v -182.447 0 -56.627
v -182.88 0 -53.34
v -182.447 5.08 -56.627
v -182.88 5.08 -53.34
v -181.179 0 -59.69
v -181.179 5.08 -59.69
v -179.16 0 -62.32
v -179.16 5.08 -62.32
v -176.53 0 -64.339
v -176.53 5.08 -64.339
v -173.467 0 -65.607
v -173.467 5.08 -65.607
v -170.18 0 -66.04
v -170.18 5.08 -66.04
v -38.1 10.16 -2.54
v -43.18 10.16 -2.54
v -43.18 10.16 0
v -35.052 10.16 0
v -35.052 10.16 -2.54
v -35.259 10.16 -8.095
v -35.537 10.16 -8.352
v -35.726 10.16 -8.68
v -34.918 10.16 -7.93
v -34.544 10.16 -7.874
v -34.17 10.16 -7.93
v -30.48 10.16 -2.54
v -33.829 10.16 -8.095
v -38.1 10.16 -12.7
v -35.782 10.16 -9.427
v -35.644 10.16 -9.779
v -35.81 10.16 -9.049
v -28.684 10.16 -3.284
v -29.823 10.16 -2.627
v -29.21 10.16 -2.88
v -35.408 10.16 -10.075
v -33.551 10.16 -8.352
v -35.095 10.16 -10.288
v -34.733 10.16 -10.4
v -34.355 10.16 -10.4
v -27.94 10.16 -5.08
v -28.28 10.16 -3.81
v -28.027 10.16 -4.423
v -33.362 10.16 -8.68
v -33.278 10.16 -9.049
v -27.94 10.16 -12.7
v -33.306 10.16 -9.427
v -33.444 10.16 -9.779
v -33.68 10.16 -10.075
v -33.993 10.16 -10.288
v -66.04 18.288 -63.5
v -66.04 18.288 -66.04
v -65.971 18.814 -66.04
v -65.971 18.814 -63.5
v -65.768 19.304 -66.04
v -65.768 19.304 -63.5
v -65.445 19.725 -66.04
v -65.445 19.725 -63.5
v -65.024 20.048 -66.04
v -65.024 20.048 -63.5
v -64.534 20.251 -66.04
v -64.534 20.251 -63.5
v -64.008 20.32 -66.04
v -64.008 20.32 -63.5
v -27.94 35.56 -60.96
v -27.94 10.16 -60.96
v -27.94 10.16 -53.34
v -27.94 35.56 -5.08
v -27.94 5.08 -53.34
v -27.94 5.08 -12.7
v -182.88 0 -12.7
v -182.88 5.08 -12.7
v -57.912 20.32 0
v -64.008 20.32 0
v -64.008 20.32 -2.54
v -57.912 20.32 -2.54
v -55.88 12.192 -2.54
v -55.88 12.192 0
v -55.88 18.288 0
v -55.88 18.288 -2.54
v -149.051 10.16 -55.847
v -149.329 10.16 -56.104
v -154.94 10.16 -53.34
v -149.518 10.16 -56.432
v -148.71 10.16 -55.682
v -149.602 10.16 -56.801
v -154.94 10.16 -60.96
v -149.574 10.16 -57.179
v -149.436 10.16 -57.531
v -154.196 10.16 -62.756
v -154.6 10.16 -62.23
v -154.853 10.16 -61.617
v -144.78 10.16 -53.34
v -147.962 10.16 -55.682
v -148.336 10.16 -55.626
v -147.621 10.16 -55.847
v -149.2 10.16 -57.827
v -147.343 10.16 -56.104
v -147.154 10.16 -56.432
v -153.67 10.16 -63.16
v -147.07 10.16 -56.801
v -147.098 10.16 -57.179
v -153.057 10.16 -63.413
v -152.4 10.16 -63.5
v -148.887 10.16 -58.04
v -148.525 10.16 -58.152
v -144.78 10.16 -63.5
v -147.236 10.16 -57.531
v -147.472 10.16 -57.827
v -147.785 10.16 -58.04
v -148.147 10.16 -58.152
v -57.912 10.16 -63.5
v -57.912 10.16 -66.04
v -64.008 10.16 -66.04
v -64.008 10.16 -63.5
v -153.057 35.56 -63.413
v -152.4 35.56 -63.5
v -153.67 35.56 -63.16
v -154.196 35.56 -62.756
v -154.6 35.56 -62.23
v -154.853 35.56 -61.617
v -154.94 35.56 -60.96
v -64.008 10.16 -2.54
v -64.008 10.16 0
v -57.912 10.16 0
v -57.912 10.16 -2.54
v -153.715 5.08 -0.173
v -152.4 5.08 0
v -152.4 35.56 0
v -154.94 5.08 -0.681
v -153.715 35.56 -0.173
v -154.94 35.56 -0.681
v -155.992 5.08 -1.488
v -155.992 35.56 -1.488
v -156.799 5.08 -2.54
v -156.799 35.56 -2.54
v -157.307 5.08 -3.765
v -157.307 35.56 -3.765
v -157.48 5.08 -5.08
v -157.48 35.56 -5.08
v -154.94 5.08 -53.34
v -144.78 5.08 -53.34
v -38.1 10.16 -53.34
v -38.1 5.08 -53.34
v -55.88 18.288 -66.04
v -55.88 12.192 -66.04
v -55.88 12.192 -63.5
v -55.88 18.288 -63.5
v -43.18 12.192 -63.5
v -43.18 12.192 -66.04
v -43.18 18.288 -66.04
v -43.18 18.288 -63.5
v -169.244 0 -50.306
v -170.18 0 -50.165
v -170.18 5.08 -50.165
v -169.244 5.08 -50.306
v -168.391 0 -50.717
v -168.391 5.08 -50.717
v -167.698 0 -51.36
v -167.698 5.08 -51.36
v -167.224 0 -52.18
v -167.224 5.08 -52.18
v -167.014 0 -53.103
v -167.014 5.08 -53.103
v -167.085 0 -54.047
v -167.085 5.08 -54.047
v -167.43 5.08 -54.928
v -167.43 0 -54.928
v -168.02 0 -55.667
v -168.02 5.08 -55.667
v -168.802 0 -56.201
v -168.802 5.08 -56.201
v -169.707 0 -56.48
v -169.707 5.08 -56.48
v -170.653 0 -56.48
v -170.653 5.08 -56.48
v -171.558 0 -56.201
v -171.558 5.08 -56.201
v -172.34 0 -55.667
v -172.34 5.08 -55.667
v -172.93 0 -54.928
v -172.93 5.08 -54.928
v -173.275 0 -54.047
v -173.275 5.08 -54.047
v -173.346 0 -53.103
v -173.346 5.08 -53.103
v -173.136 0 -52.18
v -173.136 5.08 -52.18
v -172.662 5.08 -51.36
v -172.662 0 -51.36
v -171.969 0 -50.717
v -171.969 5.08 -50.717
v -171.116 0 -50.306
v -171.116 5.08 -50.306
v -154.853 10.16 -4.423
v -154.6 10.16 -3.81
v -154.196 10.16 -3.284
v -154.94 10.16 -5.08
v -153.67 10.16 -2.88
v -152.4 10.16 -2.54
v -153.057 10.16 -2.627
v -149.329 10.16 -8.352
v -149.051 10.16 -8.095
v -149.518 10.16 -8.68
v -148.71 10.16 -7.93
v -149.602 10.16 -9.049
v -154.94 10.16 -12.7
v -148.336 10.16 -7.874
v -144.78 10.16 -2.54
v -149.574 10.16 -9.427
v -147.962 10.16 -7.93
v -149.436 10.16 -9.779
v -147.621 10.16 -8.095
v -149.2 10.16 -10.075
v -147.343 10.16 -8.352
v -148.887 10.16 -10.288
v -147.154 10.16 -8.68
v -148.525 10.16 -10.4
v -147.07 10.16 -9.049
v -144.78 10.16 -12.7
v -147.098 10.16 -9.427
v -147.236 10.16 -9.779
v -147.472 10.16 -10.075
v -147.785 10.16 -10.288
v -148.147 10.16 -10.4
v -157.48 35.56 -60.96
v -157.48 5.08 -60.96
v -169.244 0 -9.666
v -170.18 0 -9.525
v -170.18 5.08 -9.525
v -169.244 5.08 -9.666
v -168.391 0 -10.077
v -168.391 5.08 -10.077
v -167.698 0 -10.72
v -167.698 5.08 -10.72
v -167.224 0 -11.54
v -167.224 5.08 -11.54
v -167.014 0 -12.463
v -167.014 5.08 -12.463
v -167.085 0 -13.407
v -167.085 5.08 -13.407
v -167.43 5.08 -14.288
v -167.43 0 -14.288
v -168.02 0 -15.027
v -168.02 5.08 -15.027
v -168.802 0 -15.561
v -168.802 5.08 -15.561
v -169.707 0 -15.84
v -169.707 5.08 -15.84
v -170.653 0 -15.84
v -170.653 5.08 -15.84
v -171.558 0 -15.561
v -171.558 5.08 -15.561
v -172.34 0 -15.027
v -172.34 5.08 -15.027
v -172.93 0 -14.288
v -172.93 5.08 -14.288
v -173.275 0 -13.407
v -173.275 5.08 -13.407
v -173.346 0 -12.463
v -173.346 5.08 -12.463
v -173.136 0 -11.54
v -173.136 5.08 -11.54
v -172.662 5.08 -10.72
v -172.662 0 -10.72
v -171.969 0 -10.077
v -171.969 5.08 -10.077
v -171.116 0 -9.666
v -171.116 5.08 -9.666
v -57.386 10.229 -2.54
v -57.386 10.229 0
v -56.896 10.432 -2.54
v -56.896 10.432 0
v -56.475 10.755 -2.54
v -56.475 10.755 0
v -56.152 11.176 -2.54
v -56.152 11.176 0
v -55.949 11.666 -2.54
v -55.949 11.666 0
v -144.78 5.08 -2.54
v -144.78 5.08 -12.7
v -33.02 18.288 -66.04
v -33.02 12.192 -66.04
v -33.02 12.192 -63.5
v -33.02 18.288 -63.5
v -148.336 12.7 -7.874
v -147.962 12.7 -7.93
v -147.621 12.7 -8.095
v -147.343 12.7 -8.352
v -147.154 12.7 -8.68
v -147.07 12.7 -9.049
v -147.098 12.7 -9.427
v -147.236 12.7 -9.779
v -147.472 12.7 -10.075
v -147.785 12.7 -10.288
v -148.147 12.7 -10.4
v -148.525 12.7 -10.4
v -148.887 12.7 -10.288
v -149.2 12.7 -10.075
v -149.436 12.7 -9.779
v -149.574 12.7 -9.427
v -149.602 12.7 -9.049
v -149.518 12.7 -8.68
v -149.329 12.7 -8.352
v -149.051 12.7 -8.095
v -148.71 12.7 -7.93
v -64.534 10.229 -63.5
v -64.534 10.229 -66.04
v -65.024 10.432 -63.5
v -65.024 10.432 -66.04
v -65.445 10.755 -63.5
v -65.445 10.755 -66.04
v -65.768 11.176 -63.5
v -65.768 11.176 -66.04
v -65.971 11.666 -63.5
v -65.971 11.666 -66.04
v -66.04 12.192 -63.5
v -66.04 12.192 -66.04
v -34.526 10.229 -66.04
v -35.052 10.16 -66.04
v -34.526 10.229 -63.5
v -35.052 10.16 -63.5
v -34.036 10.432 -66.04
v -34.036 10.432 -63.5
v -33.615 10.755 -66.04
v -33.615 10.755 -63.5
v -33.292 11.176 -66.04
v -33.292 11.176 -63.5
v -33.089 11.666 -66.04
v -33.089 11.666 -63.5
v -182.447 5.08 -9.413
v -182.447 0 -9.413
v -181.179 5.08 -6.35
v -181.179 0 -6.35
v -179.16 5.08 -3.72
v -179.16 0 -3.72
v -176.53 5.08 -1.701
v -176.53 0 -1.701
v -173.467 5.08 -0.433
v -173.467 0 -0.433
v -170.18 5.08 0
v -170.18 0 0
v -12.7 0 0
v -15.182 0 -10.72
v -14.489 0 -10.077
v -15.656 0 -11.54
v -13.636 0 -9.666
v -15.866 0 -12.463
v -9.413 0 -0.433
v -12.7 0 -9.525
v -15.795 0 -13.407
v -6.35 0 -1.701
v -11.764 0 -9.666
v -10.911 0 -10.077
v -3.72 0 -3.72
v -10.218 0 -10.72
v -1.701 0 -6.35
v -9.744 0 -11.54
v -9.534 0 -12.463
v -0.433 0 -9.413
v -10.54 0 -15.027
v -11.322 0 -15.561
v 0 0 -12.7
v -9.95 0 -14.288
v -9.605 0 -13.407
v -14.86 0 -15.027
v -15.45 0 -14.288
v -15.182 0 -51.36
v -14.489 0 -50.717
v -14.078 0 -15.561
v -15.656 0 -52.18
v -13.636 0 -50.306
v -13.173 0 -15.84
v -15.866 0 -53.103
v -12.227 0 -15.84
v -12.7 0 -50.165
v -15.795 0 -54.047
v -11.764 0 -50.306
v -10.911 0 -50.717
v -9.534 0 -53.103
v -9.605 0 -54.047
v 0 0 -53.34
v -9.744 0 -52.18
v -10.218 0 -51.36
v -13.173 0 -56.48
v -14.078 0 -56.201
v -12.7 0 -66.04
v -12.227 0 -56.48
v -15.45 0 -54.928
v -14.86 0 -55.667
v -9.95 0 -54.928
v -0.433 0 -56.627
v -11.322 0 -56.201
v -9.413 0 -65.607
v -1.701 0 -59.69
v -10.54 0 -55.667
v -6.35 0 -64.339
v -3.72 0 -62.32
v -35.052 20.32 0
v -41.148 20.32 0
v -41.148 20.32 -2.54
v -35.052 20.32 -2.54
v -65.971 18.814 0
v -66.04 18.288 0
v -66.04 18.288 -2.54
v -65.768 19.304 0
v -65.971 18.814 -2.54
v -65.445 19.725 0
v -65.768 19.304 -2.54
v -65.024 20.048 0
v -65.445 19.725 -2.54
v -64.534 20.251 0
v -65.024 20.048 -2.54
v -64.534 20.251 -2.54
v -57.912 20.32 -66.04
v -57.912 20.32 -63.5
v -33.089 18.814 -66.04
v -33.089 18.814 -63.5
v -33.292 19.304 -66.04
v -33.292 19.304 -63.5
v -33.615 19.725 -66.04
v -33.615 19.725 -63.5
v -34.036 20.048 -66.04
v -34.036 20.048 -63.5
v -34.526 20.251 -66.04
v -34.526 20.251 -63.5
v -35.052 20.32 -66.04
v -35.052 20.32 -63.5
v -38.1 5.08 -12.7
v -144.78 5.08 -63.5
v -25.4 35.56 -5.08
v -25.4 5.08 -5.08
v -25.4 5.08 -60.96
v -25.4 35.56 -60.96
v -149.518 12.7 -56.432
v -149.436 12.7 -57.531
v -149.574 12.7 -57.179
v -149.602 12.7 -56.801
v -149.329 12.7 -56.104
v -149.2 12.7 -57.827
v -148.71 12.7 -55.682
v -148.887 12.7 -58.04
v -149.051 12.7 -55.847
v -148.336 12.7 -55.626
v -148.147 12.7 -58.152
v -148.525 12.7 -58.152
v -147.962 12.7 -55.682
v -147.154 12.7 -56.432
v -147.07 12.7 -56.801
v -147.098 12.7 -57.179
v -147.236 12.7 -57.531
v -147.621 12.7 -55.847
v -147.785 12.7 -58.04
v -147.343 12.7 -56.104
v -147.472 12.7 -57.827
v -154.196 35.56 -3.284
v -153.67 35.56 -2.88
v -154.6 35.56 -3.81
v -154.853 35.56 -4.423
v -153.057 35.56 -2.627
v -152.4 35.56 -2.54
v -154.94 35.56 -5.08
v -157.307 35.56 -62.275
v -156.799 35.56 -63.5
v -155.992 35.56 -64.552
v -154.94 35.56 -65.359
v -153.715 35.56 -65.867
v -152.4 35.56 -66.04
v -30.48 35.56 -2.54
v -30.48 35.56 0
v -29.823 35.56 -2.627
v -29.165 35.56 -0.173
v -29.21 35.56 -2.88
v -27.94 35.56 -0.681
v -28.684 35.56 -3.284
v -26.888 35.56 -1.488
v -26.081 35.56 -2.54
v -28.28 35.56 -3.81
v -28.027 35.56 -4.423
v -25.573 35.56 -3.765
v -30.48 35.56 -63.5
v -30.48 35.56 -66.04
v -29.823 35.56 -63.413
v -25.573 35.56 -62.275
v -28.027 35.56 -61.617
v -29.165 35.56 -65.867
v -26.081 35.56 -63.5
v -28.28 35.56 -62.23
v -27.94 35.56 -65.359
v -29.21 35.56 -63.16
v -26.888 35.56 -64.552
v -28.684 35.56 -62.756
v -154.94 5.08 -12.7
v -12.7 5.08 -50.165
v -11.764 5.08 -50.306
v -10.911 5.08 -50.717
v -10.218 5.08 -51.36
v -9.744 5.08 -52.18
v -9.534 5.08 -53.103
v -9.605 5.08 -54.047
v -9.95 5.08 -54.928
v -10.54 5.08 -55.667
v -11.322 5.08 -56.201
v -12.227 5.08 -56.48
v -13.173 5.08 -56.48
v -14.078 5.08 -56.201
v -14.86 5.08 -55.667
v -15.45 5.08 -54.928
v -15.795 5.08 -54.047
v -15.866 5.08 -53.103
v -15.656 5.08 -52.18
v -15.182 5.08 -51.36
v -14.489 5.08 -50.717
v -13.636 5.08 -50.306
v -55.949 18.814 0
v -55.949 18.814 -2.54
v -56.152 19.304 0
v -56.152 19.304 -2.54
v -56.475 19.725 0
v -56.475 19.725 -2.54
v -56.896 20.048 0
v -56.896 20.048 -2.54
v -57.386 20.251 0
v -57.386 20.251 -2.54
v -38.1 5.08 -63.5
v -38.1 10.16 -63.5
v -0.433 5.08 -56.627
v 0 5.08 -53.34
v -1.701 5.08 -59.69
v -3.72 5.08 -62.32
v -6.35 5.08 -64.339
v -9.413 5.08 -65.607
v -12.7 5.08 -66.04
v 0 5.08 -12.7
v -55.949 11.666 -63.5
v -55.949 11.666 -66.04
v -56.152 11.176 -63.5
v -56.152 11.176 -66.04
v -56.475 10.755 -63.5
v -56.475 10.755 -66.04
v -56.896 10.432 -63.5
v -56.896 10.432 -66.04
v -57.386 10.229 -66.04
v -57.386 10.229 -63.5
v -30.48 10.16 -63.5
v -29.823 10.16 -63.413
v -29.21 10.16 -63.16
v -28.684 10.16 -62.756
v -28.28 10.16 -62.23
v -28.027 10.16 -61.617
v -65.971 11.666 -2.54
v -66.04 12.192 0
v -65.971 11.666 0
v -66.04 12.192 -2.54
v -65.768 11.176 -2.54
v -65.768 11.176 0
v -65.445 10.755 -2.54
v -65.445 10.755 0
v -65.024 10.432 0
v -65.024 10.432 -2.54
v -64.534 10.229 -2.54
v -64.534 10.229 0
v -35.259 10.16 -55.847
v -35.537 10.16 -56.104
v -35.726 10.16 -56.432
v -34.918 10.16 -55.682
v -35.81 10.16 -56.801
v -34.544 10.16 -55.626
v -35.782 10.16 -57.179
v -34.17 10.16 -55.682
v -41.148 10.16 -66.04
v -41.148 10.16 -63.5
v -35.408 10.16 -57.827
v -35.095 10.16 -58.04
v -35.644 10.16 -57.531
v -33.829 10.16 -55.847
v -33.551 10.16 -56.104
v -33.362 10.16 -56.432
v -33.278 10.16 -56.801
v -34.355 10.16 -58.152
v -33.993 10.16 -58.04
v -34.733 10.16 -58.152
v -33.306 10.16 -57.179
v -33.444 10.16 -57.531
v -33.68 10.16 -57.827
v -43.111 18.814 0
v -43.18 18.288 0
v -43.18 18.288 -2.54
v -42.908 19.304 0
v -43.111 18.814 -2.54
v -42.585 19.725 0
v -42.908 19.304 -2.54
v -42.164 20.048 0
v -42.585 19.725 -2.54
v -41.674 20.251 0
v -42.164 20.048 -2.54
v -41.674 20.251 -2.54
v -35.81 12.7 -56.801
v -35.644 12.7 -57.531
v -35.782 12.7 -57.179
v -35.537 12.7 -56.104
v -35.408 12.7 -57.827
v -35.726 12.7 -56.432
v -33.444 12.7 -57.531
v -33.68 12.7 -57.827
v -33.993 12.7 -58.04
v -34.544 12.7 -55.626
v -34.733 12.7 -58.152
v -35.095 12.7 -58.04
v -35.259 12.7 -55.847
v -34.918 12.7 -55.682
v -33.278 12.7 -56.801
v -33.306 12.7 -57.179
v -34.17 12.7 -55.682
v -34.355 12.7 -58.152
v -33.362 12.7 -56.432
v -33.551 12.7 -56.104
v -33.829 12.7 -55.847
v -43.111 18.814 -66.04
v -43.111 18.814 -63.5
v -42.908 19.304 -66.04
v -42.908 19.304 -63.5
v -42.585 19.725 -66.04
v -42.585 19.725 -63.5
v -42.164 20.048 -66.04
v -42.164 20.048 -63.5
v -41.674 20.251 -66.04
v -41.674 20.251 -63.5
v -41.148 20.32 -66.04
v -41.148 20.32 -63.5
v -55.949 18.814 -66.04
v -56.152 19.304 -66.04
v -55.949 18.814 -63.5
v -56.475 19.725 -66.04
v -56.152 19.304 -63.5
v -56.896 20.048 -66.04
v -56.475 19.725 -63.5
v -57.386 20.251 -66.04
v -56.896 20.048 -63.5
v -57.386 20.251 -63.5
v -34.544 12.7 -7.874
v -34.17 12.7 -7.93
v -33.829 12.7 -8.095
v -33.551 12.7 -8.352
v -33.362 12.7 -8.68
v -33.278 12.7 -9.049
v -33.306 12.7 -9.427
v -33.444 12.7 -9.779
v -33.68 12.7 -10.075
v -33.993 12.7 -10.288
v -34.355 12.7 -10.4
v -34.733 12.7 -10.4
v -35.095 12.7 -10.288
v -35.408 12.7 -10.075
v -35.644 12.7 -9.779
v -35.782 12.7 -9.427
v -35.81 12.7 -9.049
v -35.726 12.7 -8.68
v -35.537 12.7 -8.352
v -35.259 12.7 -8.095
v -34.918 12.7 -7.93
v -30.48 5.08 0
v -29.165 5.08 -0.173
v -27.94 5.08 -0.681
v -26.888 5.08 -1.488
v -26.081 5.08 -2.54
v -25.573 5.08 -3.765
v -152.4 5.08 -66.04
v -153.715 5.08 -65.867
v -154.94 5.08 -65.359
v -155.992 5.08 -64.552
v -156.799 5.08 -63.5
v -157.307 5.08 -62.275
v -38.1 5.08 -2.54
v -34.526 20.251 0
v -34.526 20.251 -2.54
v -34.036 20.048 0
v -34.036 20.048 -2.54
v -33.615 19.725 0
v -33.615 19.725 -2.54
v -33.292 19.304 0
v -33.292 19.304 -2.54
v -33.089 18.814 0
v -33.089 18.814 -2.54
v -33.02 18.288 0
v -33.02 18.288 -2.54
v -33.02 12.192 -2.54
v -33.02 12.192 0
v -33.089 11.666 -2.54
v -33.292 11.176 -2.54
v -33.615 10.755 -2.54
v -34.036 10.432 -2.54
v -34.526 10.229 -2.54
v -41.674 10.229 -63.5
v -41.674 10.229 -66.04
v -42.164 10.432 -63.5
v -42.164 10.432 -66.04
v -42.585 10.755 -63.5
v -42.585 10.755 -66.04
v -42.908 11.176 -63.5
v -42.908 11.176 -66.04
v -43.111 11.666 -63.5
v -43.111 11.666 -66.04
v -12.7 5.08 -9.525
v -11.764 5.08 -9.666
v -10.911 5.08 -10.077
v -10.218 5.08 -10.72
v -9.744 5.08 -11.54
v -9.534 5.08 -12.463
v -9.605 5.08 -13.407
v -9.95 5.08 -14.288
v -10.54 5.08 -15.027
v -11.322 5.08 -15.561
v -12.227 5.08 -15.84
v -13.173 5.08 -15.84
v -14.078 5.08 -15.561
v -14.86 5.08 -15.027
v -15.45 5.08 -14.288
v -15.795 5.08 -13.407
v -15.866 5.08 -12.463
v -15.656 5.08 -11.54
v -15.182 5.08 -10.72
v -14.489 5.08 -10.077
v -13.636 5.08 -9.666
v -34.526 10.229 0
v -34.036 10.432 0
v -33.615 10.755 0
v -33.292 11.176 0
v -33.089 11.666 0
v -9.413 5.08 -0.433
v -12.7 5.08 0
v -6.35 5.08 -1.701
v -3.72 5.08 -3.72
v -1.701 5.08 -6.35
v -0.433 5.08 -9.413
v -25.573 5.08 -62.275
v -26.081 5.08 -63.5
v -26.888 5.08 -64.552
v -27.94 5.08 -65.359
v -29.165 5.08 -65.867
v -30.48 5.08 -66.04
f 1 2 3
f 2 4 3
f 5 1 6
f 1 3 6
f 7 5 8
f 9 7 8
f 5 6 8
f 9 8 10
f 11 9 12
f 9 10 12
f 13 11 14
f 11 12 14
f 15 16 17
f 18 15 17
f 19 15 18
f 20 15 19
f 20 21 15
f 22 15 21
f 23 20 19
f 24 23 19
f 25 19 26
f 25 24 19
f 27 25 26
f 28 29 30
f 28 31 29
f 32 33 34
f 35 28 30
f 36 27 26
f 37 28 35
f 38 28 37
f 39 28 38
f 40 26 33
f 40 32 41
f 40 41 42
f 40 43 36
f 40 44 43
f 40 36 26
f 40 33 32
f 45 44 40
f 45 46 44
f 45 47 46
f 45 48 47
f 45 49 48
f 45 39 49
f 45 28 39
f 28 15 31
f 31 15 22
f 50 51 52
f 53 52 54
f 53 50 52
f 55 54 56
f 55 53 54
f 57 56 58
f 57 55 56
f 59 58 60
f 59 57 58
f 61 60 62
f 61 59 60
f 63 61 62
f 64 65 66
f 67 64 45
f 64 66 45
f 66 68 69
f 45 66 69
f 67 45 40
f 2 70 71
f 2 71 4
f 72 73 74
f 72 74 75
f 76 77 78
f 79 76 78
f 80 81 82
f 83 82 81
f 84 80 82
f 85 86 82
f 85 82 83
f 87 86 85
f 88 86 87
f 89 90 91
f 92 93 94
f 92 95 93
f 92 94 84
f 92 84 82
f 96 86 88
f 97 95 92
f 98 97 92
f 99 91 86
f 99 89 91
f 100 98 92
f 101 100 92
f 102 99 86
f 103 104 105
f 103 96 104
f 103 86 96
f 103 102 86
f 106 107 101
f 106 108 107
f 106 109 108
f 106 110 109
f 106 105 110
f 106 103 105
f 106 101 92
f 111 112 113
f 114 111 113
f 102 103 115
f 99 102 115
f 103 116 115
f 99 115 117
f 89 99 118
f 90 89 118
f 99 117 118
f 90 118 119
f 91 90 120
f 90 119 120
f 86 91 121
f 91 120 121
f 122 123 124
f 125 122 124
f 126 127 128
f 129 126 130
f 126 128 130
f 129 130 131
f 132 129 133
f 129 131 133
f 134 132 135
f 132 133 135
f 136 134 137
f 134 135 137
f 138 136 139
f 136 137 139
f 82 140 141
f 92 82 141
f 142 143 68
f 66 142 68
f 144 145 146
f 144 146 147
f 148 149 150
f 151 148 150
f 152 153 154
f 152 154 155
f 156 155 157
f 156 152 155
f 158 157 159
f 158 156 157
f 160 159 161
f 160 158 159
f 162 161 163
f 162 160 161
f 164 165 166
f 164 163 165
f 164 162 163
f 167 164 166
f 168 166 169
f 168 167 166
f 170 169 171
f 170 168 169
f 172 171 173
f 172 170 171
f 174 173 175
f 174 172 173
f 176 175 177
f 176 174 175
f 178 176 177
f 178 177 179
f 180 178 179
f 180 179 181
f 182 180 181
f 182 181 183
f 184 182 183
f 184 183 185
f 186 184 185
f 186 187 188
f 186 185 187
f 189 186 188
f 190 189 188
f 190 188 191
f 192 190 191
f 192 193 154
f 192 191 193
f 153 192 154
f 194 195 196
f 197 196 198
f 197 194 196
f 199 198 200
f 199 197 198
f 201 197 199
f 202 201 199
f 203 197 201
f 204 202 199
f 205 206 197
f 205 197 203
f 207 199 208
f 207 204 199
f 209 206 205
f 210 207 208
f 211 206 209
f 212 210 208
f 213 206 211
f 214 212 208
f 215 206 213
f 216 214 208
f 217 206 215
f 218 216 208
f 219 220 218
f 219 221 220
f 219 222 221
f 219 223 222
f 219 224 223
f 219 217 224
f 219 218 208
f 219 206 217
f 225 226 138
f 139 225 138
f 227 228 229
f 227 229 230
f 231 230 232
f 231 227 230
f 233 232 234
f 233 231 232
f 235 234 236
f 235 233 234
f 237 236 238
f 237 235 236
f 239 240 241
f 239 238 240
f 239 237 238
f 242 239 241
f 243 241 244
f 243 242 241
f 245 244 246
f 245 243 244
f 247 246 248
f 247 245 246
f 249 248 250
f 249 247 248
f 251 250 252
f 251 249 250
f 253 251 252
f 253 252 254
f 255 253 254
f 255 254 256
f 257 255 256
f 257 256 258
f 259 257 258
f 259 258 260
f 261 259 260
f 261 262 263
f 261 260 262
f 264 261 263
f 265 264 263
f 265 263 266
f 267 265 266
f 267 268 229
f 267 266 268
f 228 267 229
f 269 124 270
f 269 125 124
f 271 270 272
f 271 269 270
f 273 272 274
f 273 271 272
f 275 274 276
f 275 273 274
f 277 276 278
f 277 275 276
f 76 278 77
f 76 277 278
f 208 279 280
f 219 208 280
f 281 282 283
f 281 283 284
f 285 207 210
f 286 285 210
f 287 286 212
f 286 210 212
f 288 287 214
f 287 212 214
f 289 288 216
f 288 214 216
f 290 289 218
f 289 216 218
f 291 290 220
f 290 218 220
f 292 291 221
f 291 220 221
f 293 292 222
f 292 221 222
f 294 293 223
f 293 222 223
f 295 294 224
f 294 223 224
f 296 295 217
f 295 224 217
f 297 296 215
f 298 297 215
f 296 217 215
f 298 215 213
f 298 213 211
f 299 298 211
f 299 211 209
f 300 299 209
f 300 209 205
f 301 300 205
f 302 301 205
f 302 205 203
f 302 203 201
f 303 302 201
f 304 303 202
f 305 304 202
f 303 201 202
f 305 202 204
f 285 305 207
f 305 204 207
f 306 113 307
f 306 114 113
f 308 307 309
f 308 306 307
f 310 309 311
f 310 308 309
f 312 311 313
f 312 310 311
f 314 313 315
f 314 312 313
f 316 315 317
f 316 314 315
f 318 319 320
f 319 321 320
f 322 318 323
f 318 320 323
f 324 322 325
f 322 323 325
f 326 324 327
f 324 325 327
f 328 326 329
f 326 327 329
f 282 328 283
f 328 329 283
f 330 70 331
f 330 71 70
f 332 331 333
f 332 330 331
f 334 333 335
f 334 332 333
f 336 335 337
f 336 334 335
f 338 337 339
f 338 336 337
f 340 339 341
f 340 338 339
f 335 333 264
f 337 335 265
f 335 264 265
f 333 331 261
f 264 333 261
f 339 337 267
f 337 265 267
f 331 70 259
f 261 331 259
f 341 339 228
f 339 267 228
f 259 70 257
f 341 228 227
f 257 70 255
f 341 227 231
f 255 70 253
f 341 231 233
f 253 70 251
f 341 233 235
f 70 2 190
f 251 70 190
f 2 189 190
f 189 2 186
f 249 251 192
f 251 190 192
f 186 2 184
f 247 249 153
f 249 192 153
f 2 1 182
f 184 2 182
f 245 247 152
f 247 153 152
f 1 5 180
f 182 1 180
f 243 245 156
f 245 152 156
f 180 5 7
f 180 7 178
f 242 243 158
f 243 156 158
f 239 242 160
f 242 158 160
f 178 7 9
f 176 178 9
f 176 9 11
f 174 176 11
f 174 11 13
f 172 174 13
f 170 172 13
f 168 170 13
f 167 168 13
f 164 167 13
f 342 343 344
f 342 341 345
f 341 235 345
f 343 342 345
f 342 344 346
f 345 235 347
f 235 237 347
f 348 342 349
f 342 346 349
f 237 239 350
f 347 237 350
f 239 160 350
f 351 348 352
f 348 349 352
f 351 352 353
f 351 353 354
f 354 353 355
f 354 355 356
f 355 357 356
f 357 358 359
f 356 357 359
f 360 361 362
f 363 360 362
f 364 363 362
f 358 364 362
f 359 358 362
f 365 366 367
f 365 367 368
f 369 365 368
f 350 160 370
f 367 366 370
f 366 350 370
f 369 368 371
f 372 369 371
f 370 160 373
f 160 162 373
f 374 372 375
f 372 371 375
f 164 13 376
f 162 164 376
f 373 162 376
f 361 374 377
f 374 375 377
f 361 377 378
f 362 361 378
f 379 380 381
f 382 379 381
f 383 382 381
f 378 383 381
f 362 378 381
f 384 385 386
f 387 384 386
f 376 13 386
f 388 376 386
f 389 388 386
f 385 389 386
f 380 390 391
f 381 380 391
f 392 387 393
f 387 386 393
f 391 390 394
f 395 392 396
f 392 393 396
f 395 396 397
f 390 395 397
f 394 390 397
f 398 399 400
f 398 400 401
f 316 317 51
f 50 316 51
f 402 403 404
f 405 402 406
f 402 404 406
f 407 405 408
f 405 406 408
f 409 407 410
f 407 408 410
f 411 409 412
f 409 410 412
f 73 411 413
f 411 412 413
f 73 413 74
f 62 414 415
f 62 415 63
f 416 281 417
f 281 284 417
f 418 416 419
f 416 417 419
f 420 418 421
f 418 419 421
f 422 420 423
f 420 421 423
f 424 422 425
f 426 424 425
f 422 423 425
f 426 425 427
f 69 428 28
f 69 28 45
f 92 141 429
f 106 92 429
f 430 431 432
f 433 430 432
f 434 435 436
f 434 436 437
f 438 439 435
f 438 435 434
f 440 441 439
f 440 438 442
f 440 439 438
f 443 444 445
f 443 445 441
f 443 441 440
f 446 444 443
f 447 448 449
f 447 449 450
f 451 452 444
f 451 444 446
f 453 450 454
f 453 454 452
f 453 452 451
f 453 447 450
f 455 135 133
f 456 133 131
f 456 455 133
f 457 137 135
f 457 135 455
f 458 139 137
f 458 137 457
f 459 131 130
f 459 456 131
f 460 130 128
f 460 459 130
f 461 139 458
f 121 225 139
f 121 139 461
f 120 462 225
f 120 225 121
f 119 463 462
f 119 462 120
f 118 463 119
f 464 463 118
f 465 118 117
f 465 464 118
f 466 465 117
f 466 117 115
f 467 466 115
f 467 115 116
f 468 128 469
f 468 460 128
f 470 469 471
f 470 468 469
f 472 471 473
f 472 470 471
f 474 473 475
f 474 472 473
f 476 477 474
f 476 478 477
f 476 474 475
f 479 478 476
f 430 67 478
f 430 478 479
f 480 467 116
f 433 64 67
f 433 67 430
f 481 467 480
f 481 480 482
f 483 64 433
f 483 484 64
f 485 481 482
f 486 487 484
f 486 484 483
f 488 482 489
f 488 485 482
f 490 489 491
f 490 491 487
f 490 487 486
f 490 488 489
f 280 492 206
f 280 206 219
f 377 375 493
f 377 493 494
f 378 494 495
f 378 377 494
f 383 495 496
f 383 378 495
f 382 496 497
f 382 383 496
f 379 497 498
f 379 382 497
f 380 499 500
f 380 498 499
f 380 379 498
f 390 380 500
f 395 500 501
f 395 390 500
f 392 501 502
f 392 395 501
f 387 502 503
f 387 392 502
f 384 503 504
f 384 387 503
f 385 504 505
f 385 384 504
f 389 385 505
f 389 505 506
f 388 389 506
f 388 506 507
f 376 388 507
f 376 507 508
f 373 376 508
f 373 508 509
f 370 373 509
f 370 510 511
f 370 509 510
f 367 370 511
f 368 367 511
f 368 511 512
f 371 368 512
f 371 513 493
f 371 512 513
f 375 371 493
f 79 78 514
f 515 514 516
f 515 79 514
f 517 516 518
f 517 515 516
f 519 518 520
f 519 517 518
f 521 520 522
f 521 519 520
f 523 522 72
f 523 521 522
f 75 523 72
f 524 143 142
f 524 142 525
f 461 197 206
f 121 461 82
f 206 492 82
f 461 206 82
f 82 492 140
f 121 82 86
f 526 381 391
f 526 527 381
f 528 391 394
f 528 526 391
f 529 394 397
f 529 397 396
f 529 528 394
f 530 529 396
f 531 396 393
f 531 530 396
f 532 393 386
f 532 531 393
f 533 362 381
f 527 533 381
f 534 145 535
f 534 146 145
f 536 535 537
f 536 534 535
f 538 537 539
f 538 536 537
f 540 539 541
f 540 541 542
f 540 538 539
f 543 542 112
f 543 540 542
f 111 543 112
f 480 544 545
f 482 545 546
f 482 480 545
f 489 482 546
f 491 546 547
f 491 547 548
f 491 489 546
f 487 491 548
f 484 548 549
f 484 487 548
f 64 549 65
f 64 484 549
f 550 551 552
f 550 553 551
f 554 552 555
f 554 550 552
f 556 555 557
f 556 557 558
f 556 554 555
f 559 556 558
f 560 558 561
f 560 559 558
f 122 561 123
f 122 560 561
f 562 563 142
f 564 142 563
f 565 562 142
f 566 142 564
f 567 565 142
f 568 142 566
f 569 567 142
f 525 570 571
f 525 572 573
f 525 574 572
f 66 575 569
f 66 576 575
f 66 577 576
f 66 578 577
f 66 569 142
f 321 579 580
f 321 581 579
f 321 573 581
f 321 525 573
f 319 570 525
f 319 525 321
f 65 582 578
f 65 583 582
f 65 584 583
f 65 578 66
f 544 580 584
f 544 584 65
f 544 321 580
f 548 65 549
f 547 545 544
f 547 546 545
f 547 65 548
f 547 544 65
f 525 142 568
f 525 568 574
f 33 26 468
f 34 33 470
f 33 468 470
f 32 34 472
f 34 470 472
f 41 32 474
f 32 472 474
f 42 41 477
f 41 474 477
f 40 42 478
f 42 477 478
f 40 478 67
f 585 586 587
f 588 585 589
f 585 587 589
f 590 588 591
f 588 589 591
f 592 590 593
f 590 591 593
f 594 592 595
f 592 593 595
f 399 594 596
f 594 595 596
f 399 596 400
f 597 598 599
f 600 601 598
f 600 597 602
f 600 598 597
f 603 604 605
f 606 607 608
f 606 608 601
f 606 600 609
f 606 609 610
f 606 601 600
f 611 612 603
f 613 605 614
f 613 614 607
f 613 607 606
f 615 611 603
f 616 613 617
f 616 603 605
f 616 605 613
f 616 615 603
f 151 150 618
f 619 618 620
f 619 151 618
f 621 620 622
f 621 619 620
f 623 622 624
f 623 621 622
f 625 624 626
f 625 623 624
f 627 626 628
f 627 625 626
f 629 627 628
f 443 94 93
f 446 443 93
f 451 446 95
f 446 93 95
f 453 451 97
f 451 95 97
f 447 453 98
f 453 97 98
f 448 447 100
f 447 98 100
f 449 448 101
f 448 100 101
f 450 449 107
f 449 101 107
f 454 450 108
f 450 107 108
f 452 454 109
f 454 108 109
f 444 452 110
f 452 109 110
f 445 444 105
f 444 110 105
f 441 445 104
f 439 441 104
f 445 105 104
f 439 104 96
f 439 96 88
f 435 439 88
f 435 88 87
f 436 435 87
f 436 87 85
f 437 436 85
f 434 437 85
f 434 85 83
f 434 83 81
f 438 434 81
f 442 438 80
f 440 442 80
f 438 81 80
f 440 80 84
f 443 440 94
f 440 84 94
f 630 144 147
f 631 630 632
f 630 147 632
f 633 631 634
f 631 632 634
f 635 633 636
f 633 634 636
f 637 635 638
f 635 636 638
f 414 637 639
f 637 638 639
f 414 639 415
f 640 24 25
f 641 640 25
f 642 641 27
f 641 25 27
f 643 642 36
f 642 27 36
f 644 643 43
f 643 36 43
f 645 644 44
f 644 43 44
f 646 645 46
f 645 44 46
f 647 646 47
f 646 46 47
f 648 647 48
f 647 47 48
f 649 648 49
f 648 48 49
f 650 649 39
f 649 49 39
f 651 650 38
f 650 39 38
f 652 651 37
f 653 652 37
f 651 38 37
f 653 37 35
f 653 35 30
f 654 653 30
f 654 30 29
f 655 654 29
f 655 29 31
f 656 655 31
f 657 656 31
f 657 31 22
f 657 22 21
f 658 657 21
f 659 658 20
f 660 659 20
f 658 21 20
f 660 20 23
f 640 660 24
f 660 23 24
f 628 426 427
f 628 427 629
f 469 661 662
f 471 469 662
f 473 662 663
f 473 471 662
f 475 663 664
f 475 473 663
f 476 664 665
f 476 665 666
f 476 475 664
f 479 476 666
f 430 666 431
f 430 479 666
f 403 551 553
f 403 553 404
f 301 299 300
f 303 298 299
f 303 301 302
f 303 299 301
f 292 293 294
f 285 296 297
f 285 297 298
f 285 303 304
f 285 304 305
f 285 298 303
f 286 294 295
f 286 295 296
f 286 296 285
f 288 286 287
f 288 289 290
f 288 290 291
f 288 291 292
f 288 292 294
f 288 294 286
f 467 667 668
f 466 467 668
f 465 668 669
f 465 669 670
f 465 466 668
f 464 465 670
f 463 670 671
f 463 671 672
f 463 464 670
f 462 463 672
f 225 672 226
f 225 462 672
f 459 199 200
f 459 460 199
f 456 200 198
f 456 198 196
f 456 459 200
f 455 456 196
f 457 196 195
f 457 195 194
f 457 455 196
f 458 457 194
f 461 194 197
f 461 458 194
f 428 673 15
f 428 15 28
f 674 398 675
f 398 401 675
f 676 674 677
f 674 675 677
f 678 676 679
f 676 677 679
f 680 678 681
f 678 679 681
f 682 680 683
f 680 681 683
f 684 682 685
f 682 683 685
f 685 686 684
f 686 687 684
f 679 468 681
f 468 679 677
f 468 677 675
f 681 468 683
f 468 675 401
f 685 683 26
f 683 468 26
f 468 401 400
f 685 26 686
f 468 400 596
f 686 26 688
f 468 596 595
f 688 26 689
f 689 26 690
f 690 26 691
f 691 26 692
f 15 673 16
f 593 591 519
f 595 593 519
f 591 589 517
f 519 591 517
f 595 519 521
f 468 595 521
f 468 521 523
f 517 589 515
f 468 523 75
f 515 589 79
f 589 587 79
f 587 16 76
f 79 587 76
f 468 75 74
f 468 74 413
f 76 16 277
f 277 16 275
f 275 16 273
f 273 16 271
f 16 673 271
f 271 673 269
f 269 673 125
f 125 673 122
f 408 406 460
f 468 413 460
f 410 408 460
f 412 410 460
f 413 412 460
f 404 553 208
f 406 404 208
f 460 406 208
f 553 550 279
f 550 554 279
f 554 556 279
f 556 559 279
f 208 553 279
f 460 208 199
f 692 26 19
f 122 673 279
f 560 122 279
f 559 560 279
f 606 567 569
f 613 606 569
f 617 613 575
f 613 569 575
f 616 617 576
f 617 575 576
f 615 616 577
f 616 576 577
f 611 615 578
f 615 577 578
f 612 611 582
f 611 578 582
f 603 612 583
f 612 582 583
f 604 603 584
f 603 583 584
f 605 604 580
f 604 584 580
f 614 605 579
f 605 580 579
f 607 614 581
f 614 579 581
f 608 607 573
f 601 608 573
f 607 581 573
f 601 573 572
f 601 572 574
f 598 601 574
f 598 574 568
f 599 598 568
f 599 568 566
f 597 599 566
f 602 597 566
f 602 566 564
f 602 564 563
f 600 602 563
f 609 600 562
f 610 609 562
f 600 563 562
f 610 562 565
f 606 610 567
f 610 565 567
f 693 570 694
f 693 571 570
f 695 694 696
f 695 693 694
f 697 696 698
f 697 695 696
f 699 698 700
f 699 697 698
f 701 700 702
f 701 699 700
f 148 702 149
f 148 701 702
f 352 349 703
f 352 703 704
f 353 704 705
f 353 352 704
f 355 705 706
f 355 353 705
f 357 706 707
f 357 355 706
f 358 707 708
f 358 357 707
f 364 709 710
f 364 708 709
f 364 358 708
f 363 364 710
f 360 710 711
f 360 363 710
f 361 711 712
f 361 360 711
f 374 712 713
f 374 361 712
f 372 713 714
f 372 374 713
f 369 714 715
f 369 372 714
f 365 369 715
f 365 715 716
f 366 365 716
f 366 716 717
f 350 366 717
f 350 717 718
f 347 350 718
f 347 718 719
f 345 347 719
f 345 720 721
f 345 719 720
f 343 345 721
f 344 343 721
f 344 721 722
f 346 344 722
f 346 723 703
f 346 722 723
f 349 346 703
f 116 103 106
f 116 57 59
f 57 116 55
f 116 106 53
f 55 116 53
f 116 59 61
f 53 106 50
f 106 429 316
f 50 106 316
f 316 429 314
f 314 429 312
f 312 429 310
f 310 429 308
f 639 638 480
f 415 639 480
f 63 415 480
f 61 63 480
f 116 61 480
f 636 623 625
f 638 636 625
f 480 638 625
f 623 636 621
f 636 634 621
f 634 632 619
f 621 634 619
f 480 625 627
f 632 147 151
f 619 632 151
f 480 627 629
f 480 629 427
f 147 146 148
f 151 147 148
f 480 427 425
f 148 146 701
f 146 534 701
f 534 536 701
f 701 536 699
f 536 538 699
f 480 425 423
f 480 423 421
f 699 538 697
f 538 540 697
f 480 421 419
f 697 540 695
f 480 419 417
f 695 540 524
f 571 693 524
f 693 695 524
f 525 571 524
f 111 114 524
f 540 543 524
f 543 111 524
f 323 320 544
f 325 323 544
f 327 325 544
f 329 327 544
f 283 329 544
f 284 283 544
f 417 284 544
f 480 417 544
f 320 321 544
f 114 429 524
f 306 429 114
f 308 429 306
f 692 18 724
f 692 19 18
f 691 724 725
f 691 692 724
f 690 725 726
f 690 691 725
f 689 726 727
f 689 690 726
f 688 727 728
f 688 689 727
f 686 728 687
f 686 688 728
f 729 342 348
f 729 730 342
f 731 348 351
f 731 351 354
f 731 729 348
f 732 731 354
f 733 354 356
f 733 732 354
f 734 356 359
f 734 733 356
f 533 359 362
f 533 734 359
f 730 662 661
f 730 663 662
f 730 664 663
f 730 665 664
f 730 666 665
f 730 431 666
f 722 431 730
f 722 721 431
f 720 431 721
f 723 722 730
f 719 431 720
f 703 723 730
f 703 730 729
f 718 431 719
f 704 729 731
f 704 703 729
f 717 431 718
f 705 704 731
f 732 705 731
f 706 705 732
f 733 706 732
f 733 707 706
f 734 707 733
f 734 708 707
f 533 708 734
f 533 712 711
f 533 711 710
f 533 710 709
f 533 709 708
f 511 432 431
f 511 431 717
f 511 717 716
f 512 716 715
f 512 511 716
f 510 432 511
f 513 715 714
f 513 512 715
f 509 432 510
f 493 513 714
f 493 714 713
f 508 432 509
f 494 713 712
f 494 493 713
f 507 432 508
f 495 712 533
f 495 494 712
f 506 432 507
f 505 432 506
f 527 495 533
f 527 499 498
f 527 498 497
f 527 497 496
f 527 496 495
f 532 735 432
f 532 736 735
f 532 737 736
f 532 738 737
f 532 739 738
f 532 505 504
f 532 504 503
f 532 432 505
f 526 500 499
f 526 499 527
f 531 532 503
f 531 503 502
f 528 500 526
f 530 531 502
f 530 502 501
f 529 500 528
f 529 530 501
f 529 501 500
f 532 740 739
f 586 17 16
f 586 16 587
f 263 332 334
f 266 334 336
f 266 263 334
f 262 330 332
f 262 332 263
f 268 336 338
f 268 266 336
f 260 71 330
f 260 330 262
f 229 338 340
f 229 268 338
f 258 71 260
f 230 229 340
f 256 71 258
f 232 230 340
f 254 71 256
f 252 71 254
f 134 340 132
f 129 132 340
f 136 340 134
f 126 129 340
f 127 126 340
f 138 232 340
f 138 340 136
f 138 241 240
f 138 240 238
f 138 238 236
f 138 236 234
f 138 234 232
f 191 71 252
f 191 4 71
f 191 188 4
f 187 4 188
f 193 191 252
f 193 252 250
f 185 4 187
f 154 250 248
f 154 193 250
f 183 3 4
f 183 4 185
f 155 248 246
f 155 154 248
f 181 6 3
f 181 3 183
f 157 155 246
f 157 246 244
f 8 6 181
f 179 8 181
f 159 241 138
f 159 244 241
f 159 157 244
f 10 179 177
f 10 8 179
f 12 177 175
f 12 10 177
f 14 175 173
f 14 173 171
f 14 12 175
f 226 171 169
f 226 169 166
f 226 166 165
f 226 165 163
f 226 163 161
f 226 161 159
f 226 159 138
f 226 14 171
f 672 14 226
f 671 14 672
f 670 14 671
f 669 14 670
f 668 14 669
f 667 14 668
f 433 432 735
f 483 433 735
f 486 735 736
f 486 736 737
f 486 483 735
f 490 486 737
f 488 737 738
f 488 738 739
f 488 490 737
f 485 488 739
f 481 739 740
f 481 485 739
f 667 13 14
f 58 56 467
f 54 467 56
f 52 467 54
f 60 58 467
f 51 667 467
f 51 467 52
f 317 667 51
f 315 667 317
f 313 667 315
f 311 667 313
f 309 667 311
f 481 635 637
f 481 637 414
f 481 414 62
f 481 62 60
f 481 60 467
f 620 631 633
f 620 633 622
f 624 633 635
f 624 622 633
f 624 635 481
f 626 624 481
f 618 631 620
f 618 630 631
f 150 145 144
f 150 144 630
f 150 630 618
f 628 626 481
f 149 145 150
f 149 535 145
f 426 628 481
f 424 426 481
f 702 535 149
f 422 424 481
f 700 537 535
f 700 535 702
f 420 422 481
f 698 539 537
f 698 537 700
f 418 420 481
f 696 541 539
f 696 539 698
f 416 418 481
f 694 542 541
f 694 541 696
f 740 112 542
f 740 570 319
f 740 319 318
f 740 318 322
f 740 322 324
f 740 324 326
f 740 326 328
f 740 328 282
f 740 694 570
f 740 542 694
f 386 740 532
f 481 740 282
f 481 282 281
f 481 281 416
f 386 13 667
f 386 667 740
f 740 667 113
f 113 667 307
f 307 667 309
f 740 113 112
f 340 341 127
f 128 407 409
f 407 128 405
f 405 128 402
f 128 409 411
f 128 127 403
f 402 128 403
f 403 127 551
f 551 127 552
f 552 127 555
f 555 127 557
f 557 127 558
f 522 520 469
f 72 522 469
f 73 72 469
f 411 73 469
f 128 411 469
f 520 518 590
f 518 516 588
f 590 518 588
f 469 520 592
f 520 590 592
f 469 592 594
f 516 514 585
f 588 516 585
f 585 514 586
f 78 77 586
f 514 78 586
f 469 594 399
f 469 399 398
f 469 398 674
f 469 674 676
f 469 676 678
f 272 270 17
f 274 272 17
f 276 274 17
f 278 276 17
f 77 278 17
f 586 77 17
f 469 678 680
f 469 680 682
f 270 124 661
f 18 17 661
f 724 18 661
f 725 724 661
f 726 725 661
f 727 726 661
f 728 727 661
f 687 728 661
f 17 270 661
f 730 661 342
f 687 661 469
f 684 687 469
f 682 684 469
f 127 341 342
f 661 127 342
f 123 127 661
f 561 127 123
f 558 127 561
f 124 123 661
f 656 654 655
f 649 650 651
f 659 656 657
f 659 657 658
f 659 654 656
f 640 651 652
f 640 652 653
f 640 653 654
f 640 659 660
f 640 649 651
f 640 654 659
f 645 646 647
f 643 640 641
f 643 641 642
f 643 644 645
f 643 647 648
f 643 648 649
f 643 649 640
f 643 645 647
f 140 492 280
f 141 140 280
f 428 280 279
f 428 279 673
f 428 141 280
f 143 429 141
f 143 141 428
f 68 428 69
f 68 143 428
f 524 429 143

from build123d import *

# Parameters (mm, degrees)
SKETCH1_W                      = 182.88
SKETCH1_H                      = 66.04
BOSS_EXTRUDE2_DEPTH            = 5.08
FILLET2_R                      = 12.7
CUT_EXTRUDE1_DEPTH             = 195.504967546
CUT_EXTRUDE1_DEPTH_BACK        = 195.504967546
SKETCH3_R                      = 3.175
BOSS_EXTRUDE6_DEPTH            = 30.48
SKETCH7_W                      = 10.16
SKETCH7_H                      = 10.16
BOSS_EXTRUDE8_DEPTH            = 5.08
SKETCH10_R                     = 1.27
BOSS_EXTRUDE10_DEPTH           = 2.54
CUT_EXTRUDE4_REACH             = 199.664
SKETCH12_W                     = 10.16
SKETCH12_H                     = 10.16
CUT_EXTRUDE4_DIRECTION_2_DEPTH = 198.663576817
CUT_EXTRUDE5_REACH             = 199.664
SKETCH14_W                     = 10.16
SKETCH14_H                     = 10.16
FILLET5_R                      = 2.032
FILLET6_R                      = 5.08
FILLET7_R                      = 2.54


with BuildPart() as part:
    # Sketch1 → Boss-Extrude2 (new body)
    with BuildSketch(Plane(origin=(0, 0, 0), x_dir=(1, 0, 0), z_dir=(0, 1, 0))):
        with Locations((-91.44, 33.02)):
            Rectangle(SKETCH1_W, SKETCH1_H)
    extrude(amount=BOSS_EXTRUDE2_DEPTH)

    # Fillet2
    fillet2_edges = [part.edges().sort_by_distance(p)[0] for p in [
        (0, 2.54, 0),
        (-182.88, 2.54, 0),
        (-182.88, 2.54, -66.04),
        (0, 2.54, -66.04),
    ]]
    fillet(fillet2_edges, radius=FILLET2_R)

    # Sketch3 → Cut-Extrude1 (cut, two sides: drawn at the far end of the back side and taken through both)
    with BuildSketch(Plane(origin=(0, 5.08, 0), x_dir=(1, 0, 0), z_dir=(0, 1, 0)).offset(-CUT_EXTRUDE1_DEPTH_BACK)):
        with Locations(Location((-12.7, 12.7, 0), (0, 0, 270))):
            Circle(SKETCH3_R)
        with Locations(Location((-12.7, 53.34, 0), (0, 0, 270))):
            Circle(SKETCH3_R)
        with Locations(Location((-170.18, 53.34, 0), (0, 0, 270))):
            Circle(SKETCH3_R)
        with Locations(Location((-170.18, 12.7, 0), (0, 0, 270))):
            Circle(SKETCH3_R)
    extrude(amount=CUT_EXTRUDE1_DEPTH + CUT_EXTRUDE1_DEPTH_BACK, mode=Mode.SUBTRACT)

    # Sketch4 → Boss-Extrude6 (add)
    with BuildSketch(Plane(origin=(0, 5.08, 0), x_dir=(1, 0, 0), z_dir=(0, 1, 0))):
        Polygon((-157.48, 0), (-30.606358486, 0), (-25.4, 0), (-25.4, 66.04), (-157.48, 66.04), align=None)
        Polygon((-27.94, 55.88), (-27.94, 10.16), (-27.94, 2.54), (-35.56, 2.54), (-147.32, 2.54), (-154.94, 2.54), (-154.94, 10.16), (-154.94, 55.88), (-154.94, 63.5), (-147.32, 63.5), (-35.56, 63.5), (-27.94, 63.5), align=None, mode=Mode.SUBTRACT)
    extrude(amount=BOSS_EXTRUDE6_DEPTH)

    # Sketch7 → Boss-Extrude8 (add)
    with BuildSketch(Plane(origin=(0, 5.08, 0), x_dir=(1, 0, 0), z_dir=(0, 1, 0))):
        with Locations((-33.02, 7.62)):
            Rectangle(SKETCH7_W, SKETCH7_H)
        with Locations((-149.86, 7.62)):
            Rectangle(SKETCH7_W, SKETCH7_H)
        with Locations((-149.86, 58.42)):
            Rectangle(SKETCH7_W, SKETCH7_H)
        with Locations((-33.02, 58.42)):
            Rectangle(SKETCH7_W, SKETCH7_H)
    extrude(amount=BOSS_EXTRUDE8_DEPTH)

    # Sketch10 → Boss-Extrude10 (add)
    with BuildSketch(Plane(origin=(0, 10.16, 0), x_dir=(1, 0, 0), z_dir=(0, 1, 0))):
        with Locations(Location((-34.544, 9.144, 0), (0, 0, 270))):
            Circle(SKETCH10_R)
        with Locations(Location((-148.336, 9.144, 0), (0, 0, 270))):
            Circle(SKETCH10_R)
        with Locations(Location((-148.336, 56.896, 0), (0, 0, 270))):
            Circle(SKETCH10_R)
        with Locations(Location((-34.544, 56.896, 0), (0, 0, 270))):
            Circle(SKETCH10_R)
    extrude(amount=BOSS_EXTRUDE10_DEPTH)

    # Sketch12 → Cut-Extrude4 (cut, up to next)
    with BuildSketch(Plane(origin=(0, 0, -66.04), x_dir=(-1, 0, 0), z_dir=(0, 0, -1)), mode=Mode.PRIVATE) as cut_extrude4_sk1:
        with Locations((38.1, 15.24)):
            Rectangle(SKETCH12_W, SKETCH12_H)
    cut_extrude4_tool1 = extrude(cut_extrude4_sk1.sketch, amount=-CUT_EXTRUDE4_REACH, mode=Mode.PRIVATE) & part.part
    # Sketch12 → Cut-Extrude4 (cut, up to next)
    with BuildSketch(Plane(origin=(0, 0, -66.04), x_dir=(-1, 0, 0), z_dir=(0, 0, -1)), mode=Mode.PRIVATE) as cut_extrude4_sk2:
        with Locations((60.96, 15.24)):
            Rectangle(SKETCH12_W, SKETCH12_H)
    cut_extrude4_tool2 = extrude(cut_extrude4_sk2.sketch, amount=-CUT_EXTRUDE4_REACH, mode=Mode.PRIVATE) & part.part
    add(cut_extrude4_tool1.solids().sort_by_distance((-38.1, 15.24, -66.04))[0], mode=Mode.SUBTRACT)
    add(cut_extrude4_tool2.solids().sort_by_distance((-60.96, 15.24, -66.04))[0], mode=Mode.SUBTRACT)

    # Sketch12 → Cut-Extrude4 direction 2 (cut)
    with BuildSketch(Plane(origin=(0, 0, -66.04), x_dir=(-1, 0, 0), z_dir=(0, 0, -1))):
        with Locations((38.1, 15.24)):
            Rectangle(SKETCH12_W, SKETCH12_H)
        with Locations((60.96, 15.24)):
            Rectangle(SKETCH12_W, SKETCH12_H)
    extrude(amount=CUT_EXTRUDE4_DIRECTION_2_DEPTH, mode=Mode.SUBTRACT)

    # Sketch14 → Cut-Extrude5 (cut, up to next)
    with BuildSketch(Plane.XY, mode=Mode.PRIVATE) as cut_extrude5_sk1:
        with Locations((-38.1, 15.24)):
            Rectangle(SKETCH14_W, SKETCH14_H)
    cut_extrude5_tool1 = extrude(cut_extrude5_sk1.sketch, amount=-CUT_EXTRUDE5_REACH, mode=Mode.PRIVATE) & part.part
    # Sketch14 → Cut-Extrude5 (cut, up to next)
    with BuildSketch(Plane.XY, mode=Mode.PRIVATE) as cut_extrude5_sk2:
        with Locations((-60.96, 15.24)):
            Rectangle(SKETCH14_W, SKETCH14_H)
    cut_extrude5_tool2 = extrude(cut_extrude5_sk2.sketch, amount=-CUT_EXTRUDE5_REACH, mode=Mode.PRIVATE) & part.part
    add(cut_extrude5_tool1.solids().sort_by_distance((-38.1, 15.24, 0))[0], mode=Mode.SUBTRACT)
    add(cut_extrude5_tool2.solids().sort_by_distance((-60.96, 15.24, 0))[0], mode=Mode.SUBTRACT)

    # Fillet5
    fillet5_edges = [part.edges().sort_by_distance(p)[0] for p in [
        (-33.02, 20.32, -64.77),
        (-33.02, 10.16, -64.77),
        (-43.18, 10.16, -64.77),
        (-43.18, 20.32, -64.77),
        (-55.88, 20.32, -64.77),
        (-55.88, 10.16, -64.77),
        (-66.04, 10.16, -64.77),
        (-66.04, 20.32, -64.77),
        (-43.18, 20.32, -1.27),
        (-33.02, 20.32, -1.27),
        (-33.02, 10.16, -1.27),
        (-66.04, 10.16, -1.27),
        (-66.04, 20.32, -1.27),
        (-55.88, 20.32, -1.27),
        (-55.88, 10.16, -1.27),
    ]]
    fillet(fillet5_edges, radius=FILLET5_R)

    # Fillet6
    fillet6_edges = [part.edges().sort_by_distance(p)[0] for p in [
        (-157.48, 20.32, -66.04),
        (-157.48, 20.32, 0),
        (-25.4, 20.32, 0),
        (-25.4, 20.32, -66.04),
    ]]
    fillet(fillet6_edges, radius=FILLET6_R)

    # Fillet7
    fillet7_edges = [part.edges().sort_by_distance(p)[0] for p in [
        (-27.94, 22.86, -2.54),
        (-154.94, 22.86, -2.54),
        (-154.94, 22.86, -63.5),
        (-27.94, 22.86, -63.5),
    ]]
    fillet(fillet7_edges, radius=FILLET7_R)


solid = part.part
